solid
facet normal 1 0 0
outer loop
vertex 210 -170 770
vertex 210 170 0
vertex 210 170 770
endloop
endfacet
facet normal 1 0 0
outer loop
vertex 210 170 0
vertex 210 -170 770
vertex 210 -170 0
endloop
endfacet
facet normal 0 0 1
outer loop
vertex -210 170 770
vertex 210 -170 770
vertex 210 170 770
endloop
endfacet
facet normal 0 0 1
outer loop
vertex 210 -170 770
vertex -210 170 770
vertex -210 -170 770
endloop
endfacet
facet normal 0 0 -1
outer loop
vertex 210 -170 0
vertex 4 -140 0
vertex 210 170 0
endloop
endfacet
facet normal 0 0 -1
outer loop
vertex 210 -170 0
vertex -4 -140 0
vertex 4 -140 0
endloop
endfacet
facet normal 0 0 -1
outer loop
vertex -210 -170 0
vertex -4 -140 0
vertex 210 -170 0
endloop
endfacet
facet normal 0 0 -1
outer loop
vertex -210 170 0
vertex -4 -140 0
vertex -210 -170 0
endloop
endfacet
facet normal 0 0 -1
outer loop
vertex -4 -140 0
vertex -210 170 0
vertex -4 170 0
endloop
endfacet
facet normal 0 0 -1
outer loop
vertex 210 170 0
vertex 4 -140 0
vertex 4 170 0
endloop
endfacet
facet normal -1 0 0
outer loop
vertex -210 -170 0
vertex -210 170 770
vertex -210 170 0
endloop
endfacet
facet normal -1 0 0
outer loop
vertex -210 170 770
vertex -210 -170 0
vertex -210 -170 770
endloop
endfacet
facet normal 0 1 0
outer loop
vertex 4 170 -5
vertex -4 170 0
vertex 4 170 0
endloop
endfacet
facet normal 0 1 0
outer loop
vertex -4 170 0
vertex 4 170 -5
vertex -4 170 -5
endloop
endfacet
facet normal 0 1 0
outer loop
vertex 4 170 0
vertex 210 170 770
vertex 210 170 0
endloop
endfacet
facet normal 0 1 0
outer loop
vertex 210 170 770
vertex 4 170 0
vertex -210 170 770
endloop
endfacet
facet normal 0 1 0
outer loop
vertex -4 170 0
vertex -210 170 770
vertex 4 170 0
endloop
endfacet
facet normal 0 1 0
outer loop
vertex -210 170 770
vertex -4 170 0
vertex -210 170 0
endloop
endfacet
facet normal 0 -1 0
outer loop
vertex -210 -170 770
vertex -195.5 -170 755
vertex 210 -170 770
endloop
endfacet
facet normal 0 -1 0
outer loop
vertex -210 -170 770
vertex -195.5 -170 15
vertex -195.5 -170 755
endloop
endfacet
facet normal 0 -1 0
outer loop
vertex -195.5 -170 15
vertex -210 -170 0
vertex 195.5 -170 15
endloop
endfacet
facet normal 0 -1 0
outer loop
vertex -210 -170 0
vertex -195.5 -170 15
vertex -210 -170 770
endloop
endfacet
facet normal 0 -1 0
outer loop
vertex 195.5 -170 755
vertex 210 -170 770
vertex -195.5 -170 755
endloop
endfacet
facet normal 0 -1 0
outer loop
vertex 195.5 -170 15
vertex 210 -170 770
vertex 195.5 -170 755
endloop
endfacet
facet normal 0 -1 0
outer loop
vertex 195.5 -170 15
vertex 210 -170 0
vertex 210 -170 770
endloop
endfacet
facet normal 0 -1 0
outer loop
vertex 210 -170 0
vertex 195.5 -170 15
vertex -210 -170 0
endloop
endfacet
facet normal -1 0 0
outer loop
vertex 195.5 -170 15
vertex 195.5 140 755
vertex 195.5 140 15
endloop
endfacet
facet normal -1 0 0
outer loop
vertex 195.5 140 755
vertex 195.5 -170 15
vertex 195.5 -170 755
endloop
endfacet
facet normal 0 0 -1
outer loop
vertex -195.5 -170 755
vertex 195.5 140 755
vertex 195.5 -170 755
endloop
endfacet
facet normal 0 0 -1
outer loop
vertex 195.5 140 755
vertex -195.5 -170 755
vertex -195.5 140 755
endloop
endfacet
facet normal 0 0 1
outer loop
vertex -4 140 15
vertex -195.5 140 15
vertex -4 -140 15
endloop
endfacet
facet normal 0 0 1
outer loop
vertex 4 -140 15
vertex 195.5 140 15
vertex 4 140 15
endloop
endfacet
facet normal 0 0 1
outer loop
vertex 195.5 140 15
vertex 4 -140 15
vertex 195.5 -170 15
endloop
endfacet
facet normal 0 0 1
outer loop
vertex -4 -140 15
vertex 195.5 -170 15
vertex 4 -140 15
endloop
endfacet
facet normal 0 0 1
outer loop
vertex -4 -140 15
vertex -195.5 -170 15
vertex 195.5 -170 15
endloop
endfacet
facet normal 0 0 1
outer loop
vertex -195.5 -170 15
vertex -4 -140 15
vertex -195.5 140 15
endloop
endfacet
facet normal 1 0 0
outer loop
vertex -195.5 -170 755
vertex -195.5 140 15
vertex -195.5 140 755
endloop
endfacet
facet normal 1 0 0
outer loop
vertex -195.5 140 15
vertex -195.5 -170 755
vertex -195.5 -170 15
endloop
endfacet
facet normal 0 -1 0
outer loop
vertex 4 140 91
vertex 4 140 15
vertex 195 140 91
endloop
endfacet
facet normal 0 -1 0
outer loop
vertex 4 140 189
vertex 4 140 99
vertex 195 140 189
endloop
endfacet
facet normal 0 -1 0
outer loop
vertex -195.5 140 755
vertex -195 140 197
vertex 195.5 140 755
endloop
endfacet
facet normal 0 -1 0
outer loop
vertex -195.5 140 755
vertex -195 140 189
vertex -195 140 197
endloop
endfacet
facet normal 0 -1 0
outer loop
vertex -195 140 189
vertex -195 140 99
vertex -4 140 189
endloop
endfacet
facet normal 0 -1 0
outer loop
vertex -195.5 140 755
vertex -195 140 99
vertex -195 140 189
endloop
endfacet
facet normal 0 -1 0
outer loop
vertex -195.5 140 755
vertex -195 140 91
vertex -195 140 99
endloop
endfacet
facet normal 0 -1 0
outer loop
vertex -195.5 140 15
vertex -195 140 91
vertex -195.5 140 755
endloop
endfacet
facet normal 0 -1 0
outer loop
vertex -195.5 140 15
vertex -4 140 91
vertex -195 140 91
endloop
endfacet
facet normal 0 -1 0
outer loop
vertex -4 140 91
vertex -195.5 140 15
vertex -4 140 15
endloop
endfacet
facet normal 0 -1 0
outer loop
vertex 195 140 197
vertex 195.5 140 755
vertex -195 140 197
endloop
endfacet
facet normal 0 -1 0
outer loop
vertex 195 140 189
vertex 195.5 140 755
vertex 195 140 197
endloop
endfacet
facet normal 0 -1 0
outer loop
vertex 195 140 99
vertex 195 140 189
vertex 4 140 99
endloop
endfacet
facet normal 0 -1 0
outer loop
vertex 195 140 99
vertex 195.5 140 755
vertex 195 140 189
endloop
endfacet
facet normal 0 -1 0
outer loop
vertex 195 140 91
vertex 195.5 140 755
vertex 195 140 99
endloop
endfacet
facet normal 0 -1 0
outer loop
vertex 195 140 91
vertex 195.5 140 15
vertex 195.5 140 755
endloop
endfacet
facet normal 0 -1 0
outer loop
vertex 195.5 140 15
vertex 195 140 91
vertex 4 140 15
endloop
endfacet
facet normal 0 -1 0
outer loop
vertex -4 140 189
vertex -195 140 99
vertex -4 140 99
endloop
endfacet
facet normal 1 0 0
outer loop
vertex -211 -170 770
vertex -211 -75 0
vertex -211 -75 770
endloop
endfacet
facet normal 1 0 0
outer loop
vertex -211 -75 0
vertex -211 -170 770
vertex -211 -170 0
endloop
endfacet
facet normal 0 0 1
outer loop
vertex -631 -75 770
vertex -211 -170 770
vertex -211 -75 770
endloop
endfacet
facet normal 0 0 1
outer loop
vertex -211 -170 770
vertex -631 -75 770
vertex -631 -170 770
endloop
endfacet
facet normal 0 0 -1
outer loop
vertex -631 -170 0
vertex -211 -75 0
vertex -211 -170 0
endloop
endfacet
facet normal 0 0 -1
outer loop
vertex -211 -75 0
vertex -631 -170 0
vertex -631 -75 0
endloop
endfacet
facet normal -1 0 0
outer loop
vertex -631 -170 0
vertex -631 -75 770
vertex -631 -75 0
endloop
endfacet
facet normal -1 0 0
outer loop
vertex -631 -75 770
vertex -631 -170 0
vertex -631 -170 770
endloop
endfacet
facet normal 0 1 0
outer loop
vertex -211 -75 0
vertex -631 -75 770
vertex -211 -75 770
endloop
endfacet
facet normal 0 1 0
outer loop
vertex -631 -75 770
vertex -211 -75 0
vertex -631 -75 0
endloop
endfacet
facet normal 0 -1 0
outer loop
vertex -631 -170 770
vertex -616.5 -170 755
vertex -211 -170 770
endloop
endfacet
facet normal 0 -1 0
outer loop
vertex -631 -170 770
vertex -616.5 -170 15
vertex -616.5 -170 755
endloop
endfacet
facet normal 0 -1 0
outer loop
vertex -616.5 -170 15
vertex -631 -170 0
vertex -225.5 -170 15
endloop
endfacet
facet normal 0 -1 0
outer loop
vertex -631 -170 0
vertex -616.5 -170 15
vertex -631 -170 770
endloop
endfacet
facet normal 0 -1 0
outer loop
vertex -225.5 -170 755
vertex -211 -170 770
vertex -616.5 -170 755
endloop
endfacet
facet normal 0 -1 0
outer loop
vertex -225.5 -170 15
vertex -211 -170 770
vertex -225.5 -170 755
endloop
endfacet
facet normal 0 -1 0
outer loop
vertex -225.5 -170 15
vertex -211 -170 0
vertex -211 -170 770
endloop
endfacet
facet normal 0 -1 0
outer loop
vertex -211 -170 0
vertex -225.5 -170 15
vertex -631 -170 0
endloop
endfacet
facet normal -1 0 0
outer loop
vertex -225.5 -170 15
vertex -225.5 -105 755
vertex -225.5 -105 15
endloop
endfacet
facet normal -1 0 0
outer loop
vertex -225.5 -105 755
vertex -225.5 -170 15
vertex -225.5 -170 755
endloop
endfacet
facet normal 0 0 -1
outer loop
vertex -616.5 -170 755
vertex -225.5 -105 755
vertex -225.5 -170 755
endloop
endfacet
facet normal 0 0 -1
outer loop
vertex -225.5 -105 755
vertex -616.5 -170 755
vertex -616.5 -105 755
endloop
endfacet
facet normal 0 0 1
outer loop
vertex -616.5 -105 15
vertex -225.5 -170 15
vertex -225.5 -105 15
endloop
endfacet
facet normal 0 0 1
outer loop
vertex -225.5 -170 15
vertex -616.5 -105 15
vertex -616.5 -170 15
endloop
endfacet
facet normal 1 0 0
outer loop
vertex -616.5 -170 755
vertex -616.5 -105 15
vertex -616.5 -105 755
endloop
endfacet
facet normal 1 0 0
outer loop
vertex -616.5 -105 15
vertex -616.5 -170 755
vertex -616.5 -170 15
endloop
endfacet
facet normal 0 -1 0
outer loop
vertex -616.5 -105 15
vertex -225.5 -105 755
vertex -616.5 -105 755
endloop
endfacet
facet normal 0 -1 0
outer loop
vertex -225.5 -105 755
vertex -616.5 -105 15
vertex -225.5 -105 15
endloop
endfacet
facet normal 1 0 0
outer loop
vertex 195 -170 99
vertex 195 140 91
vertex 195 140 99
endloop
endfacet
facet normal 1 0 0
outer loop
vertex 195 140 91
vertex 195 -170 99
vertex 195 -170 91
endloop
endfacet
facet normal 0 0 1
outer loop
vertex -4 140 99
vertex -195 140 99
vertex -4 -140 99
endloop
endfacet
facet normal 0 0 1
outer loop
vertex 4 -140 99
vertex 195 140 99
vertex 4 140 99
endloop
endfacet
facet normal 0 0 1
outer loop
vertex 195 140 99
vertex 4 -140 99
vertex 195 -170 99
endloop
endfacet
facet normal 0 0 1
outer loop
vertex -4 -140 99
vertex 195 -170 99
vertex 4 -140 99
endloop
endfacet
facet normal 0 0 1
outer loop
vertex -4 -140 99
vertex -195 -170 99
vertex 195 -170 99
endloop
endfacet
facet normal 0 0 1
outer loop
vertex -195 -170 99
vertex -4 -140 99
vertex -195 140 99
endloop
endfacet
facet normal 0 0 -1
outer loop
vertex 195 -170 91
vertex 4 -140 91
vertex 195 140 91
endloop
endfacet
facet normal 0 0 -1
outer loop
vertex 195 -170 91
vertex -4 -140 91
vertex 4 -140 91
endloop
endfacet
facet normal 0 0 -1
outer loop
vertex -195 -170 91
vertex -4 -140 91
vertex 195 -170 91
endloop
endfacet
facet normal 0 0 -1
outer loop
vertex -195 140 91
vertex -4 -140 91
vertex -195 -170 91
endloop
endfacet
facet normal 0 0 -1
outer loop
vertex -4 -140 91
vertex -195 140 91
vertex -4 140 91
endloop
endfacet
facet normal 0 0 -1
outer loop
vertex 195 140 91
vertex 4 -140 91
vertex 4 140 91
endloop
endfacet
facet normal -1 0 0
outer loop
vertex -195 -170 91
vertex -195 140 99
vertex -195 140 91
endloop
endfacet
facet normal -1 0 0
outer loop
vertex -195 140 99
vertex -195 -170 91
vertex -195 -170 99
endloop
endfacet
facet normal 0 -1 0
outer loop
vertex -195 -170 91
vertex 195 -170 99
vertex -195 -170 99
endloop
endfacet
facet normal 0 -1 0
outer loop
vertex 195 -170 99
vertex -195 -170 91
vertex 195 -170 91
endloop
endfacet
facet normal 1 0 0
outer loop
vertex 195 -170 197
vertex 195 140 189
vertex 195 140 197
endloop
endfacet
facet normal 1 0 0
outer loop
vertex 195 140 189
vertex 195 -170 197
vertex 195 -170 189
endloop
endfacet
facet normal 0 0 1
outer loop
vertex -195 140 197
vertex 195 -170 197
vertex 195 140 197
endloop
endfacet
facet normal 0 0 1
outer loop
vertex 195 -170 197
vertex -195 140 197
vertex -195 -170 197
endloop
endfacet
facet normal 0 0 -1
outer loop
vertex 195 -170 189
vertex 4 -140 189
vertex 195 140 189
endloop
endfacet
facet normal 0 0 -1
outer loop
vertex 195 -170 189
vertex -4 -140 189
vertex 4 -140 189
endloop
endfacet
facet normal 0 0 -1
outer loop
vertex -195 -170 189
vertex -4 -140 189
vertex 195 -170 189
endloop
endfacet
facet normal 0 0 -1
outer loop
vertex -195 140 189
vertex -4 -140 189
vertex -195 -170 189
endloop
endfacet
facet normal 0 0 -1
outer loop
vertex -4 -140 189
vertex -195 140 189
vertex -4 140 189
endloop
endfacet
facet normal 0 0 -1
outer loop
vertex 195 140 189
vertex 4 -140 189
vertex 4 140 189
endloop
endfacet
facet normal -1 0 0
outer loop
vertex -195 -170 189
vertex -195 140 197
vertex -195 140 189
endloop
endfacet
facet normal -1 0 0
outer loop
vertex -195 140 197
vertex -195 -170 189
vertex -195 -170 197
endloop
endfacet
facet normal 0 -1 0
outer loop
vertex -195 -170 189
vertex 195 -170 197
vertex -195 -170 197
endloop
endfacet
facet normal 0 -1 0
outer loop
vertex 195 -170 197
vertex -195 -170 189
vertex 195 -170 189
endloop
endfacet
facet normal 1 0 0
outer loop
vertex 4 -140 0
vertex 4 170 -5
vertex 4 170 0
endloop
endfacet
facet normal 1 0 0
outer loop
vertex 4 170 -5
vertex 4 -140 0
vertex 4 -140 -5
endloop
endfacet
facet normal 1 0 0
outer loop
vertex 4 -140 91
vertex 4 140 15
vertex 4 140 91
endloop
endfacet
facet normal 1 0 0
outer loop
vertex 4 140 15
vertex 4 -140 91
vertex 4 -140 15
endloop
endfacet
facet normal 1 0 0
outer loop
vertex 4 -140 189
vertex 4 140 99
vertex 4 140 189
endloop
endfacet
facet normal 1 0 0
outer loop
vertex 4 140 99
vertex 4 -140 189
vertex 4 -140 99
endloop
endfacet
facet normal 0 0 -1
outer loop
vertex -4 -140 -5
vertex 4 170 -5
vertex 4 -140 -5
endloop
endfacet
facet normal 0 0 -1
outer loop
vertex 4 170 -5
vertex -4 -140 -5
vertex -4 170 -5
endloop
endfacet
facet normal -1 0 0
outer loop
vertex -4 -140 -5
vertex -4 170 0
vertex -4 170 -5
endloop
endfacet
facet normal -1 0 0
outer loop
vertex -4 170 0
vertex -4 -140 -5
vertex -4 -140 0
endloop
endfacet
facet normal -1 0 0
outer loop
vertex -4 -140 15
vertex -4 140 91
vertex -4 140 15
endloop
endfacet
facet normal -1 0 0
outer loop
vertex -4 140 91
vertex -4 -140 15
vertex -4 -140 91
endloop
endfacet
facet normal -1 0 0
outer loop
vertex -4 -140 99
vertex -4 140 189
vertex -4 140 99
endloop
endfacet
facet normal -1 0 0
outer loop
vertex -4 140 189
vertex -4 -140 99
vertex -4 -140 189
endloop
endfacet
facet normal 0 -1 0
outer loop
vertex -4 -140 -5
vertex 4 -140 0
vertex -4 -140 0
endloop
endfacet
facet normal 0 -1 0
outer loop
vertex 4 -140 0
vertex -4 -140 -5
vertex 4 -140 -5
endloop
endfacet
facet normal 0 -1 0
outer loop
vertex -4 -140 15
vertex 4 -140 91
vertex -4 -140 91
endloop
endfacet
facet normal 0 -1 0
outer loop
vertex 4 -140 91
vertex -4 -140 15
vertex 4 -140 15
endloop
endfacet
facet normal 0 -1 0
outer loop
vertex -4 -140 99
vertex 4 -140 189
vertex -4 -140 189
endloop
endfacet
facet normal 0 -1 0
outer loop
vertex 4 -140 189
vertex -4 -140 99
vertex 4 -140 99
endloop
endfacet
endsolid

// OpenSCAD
module box(width, length, height, wallThickness, open = "top") {    
    // inner core in the center, equals to open == "none"
    innerHeight = open == "bottom" ? height+1 : (open == "top" ? height+1 : height);
    innerZ = open == "bottom" ? -wallThickness : (open == "top" ? wallThickness : 0);


    innerWidth = open == "left" ? width+1 : (open == "right" ? width+1 : width);
    innerX = open == "left" ? -wallThickness : (open == "right" ? wallThickness : 0);

    innerLength = open == "front" ? length+1 : (open == "back" ? length+1 : length);
    innerY = open == "front" ? -wallThickness : (open == "back" ? wallThickness : 0);


    translate([0, 0, height / 2 + wallThickness])
    difference() {
        cube(size = [length + 2 * wallThickness, width + 2 * wallThickness, height + 2 * wallThickness], center = true);
        translate([innerX, innerY, innerZ])
            cube(size = [innerLength, innerWidth, innerHeight], center = true);
    }
}

// box
box(width = 310, length = 390, height = 740, wallThickness = 15, open = "front" );
// deckel
translate([-421, -122.5, 0])
    box(width = 65, length = 390, height = 740, wallThickness = 15, open = "front" );

// weinfächer
translate([0, -15, 95])
    cube(size = [390, 310, 8], center= true);
translate([0, -15, 193])
    cube(size = [390, 310, 8], center= true);

translate([0, 15, 95])
    cube(size = [8, 310,200], center= true);
